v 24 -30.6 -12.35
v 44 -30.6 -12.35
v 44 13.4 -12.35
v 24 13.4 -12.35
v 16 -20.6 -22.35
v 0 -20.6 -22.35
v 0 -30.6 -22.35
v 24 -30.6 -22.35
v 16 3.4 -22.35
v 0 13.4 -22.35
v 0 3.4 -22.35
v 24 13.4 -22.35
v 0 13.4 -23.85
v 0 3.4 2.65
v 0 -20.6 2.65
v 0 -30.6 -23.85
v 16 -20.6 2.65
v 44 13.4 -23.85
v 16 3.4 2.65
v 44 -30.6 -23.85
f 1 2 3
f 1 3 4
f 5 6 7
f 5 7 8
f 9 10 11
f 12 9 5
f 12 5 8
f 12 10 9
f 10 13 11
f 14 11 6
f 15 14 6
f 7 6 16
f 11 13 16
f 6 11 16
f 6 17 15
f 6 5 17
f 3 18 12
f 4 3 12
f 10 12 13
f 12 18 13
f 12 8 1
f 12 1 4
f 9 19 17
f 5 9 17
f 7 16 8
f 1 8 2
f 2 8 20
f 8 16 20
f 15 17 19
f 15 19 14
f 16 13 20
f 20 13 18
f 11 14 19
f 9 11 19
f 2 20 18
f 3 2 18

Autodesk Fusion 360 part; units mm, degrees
sketch "Esquisse1" plane through (0, 0, 0) normal (0, 0, 1) x (1, 0, 0)
  line L0 (0, 0) -> (4.4, 0)
  line L1 (4.4, 0) -> (4.4, 4.4)
  line L2 (4.4, 4.4) -> (0, 4.4)
  line L3 (0, 4.4) -> (0, 0)
  dimension "d1" = 4.4
  dimension "d2" = 4.4
extrude "Extrusion1" add sketch "Esquisse1" along normal blind 0.15
sketch "Esquisse2" plane through (0, 0, 0.15) normal (0, 0, 1) x (-1, 0, 0)
  line L0 (0, -4.4) -> (0, 0)
  line L1 (0, 0) -> (-4.4, 0)
  line L2 (-4.4, 0) -> (-4.4, -4.4)
  line L3 (-4.4, -4.4) -> (0, -4.4)
  line L4 (-4.4, 0) -> (-2.4, 0)
  line L5 (-2.4, 0) -> (-2.4, -4.4)
  line L6 (-2.4, -4.4) -> (-4.4, -4.4)
  line L7 (-4.4, -4.4) -> (-4.4, 0)
  dimension "d5" = 2
extrude "Extrusion2" add sketch "Esquisse2" along normal blind 1 contours L1 L2 L3 L4 L5 L6 L7
sketch "Esquisse3" plane through (0, 0, 0.15) normal (0, 0, 1) x (-1, 0, 0)
  line L0 (-2.4, 0) -> (-2.4, -4.4)
  line L1 (-2.4, -4.4) -> (0, -4.4)
  line L2 (0, -4.4) -> (0, 0)
  line L3 (0, 0) -> (-2.4, 0)
  line L4 (0, -3.4) -> (-1.6, -3.4)
  line L5 (-1.6, -3.4) -> (-1.6, -1)
  line L6 (-1.6, -1) -> (0, -1)
  line L7 (0, -1) -> (0, -3.4)
  dimension "d8" = 1.6
  dimension "d9" = 2.4
  dimension "d11" = 1
extrude "Extrusion3" add sketch "Esquisse3" along normal blind 2.5 contours L2 L4 L5 L6 L7
scale "Echelle1" factor 10 about (0, 3.4, 2.65) bodies 1
